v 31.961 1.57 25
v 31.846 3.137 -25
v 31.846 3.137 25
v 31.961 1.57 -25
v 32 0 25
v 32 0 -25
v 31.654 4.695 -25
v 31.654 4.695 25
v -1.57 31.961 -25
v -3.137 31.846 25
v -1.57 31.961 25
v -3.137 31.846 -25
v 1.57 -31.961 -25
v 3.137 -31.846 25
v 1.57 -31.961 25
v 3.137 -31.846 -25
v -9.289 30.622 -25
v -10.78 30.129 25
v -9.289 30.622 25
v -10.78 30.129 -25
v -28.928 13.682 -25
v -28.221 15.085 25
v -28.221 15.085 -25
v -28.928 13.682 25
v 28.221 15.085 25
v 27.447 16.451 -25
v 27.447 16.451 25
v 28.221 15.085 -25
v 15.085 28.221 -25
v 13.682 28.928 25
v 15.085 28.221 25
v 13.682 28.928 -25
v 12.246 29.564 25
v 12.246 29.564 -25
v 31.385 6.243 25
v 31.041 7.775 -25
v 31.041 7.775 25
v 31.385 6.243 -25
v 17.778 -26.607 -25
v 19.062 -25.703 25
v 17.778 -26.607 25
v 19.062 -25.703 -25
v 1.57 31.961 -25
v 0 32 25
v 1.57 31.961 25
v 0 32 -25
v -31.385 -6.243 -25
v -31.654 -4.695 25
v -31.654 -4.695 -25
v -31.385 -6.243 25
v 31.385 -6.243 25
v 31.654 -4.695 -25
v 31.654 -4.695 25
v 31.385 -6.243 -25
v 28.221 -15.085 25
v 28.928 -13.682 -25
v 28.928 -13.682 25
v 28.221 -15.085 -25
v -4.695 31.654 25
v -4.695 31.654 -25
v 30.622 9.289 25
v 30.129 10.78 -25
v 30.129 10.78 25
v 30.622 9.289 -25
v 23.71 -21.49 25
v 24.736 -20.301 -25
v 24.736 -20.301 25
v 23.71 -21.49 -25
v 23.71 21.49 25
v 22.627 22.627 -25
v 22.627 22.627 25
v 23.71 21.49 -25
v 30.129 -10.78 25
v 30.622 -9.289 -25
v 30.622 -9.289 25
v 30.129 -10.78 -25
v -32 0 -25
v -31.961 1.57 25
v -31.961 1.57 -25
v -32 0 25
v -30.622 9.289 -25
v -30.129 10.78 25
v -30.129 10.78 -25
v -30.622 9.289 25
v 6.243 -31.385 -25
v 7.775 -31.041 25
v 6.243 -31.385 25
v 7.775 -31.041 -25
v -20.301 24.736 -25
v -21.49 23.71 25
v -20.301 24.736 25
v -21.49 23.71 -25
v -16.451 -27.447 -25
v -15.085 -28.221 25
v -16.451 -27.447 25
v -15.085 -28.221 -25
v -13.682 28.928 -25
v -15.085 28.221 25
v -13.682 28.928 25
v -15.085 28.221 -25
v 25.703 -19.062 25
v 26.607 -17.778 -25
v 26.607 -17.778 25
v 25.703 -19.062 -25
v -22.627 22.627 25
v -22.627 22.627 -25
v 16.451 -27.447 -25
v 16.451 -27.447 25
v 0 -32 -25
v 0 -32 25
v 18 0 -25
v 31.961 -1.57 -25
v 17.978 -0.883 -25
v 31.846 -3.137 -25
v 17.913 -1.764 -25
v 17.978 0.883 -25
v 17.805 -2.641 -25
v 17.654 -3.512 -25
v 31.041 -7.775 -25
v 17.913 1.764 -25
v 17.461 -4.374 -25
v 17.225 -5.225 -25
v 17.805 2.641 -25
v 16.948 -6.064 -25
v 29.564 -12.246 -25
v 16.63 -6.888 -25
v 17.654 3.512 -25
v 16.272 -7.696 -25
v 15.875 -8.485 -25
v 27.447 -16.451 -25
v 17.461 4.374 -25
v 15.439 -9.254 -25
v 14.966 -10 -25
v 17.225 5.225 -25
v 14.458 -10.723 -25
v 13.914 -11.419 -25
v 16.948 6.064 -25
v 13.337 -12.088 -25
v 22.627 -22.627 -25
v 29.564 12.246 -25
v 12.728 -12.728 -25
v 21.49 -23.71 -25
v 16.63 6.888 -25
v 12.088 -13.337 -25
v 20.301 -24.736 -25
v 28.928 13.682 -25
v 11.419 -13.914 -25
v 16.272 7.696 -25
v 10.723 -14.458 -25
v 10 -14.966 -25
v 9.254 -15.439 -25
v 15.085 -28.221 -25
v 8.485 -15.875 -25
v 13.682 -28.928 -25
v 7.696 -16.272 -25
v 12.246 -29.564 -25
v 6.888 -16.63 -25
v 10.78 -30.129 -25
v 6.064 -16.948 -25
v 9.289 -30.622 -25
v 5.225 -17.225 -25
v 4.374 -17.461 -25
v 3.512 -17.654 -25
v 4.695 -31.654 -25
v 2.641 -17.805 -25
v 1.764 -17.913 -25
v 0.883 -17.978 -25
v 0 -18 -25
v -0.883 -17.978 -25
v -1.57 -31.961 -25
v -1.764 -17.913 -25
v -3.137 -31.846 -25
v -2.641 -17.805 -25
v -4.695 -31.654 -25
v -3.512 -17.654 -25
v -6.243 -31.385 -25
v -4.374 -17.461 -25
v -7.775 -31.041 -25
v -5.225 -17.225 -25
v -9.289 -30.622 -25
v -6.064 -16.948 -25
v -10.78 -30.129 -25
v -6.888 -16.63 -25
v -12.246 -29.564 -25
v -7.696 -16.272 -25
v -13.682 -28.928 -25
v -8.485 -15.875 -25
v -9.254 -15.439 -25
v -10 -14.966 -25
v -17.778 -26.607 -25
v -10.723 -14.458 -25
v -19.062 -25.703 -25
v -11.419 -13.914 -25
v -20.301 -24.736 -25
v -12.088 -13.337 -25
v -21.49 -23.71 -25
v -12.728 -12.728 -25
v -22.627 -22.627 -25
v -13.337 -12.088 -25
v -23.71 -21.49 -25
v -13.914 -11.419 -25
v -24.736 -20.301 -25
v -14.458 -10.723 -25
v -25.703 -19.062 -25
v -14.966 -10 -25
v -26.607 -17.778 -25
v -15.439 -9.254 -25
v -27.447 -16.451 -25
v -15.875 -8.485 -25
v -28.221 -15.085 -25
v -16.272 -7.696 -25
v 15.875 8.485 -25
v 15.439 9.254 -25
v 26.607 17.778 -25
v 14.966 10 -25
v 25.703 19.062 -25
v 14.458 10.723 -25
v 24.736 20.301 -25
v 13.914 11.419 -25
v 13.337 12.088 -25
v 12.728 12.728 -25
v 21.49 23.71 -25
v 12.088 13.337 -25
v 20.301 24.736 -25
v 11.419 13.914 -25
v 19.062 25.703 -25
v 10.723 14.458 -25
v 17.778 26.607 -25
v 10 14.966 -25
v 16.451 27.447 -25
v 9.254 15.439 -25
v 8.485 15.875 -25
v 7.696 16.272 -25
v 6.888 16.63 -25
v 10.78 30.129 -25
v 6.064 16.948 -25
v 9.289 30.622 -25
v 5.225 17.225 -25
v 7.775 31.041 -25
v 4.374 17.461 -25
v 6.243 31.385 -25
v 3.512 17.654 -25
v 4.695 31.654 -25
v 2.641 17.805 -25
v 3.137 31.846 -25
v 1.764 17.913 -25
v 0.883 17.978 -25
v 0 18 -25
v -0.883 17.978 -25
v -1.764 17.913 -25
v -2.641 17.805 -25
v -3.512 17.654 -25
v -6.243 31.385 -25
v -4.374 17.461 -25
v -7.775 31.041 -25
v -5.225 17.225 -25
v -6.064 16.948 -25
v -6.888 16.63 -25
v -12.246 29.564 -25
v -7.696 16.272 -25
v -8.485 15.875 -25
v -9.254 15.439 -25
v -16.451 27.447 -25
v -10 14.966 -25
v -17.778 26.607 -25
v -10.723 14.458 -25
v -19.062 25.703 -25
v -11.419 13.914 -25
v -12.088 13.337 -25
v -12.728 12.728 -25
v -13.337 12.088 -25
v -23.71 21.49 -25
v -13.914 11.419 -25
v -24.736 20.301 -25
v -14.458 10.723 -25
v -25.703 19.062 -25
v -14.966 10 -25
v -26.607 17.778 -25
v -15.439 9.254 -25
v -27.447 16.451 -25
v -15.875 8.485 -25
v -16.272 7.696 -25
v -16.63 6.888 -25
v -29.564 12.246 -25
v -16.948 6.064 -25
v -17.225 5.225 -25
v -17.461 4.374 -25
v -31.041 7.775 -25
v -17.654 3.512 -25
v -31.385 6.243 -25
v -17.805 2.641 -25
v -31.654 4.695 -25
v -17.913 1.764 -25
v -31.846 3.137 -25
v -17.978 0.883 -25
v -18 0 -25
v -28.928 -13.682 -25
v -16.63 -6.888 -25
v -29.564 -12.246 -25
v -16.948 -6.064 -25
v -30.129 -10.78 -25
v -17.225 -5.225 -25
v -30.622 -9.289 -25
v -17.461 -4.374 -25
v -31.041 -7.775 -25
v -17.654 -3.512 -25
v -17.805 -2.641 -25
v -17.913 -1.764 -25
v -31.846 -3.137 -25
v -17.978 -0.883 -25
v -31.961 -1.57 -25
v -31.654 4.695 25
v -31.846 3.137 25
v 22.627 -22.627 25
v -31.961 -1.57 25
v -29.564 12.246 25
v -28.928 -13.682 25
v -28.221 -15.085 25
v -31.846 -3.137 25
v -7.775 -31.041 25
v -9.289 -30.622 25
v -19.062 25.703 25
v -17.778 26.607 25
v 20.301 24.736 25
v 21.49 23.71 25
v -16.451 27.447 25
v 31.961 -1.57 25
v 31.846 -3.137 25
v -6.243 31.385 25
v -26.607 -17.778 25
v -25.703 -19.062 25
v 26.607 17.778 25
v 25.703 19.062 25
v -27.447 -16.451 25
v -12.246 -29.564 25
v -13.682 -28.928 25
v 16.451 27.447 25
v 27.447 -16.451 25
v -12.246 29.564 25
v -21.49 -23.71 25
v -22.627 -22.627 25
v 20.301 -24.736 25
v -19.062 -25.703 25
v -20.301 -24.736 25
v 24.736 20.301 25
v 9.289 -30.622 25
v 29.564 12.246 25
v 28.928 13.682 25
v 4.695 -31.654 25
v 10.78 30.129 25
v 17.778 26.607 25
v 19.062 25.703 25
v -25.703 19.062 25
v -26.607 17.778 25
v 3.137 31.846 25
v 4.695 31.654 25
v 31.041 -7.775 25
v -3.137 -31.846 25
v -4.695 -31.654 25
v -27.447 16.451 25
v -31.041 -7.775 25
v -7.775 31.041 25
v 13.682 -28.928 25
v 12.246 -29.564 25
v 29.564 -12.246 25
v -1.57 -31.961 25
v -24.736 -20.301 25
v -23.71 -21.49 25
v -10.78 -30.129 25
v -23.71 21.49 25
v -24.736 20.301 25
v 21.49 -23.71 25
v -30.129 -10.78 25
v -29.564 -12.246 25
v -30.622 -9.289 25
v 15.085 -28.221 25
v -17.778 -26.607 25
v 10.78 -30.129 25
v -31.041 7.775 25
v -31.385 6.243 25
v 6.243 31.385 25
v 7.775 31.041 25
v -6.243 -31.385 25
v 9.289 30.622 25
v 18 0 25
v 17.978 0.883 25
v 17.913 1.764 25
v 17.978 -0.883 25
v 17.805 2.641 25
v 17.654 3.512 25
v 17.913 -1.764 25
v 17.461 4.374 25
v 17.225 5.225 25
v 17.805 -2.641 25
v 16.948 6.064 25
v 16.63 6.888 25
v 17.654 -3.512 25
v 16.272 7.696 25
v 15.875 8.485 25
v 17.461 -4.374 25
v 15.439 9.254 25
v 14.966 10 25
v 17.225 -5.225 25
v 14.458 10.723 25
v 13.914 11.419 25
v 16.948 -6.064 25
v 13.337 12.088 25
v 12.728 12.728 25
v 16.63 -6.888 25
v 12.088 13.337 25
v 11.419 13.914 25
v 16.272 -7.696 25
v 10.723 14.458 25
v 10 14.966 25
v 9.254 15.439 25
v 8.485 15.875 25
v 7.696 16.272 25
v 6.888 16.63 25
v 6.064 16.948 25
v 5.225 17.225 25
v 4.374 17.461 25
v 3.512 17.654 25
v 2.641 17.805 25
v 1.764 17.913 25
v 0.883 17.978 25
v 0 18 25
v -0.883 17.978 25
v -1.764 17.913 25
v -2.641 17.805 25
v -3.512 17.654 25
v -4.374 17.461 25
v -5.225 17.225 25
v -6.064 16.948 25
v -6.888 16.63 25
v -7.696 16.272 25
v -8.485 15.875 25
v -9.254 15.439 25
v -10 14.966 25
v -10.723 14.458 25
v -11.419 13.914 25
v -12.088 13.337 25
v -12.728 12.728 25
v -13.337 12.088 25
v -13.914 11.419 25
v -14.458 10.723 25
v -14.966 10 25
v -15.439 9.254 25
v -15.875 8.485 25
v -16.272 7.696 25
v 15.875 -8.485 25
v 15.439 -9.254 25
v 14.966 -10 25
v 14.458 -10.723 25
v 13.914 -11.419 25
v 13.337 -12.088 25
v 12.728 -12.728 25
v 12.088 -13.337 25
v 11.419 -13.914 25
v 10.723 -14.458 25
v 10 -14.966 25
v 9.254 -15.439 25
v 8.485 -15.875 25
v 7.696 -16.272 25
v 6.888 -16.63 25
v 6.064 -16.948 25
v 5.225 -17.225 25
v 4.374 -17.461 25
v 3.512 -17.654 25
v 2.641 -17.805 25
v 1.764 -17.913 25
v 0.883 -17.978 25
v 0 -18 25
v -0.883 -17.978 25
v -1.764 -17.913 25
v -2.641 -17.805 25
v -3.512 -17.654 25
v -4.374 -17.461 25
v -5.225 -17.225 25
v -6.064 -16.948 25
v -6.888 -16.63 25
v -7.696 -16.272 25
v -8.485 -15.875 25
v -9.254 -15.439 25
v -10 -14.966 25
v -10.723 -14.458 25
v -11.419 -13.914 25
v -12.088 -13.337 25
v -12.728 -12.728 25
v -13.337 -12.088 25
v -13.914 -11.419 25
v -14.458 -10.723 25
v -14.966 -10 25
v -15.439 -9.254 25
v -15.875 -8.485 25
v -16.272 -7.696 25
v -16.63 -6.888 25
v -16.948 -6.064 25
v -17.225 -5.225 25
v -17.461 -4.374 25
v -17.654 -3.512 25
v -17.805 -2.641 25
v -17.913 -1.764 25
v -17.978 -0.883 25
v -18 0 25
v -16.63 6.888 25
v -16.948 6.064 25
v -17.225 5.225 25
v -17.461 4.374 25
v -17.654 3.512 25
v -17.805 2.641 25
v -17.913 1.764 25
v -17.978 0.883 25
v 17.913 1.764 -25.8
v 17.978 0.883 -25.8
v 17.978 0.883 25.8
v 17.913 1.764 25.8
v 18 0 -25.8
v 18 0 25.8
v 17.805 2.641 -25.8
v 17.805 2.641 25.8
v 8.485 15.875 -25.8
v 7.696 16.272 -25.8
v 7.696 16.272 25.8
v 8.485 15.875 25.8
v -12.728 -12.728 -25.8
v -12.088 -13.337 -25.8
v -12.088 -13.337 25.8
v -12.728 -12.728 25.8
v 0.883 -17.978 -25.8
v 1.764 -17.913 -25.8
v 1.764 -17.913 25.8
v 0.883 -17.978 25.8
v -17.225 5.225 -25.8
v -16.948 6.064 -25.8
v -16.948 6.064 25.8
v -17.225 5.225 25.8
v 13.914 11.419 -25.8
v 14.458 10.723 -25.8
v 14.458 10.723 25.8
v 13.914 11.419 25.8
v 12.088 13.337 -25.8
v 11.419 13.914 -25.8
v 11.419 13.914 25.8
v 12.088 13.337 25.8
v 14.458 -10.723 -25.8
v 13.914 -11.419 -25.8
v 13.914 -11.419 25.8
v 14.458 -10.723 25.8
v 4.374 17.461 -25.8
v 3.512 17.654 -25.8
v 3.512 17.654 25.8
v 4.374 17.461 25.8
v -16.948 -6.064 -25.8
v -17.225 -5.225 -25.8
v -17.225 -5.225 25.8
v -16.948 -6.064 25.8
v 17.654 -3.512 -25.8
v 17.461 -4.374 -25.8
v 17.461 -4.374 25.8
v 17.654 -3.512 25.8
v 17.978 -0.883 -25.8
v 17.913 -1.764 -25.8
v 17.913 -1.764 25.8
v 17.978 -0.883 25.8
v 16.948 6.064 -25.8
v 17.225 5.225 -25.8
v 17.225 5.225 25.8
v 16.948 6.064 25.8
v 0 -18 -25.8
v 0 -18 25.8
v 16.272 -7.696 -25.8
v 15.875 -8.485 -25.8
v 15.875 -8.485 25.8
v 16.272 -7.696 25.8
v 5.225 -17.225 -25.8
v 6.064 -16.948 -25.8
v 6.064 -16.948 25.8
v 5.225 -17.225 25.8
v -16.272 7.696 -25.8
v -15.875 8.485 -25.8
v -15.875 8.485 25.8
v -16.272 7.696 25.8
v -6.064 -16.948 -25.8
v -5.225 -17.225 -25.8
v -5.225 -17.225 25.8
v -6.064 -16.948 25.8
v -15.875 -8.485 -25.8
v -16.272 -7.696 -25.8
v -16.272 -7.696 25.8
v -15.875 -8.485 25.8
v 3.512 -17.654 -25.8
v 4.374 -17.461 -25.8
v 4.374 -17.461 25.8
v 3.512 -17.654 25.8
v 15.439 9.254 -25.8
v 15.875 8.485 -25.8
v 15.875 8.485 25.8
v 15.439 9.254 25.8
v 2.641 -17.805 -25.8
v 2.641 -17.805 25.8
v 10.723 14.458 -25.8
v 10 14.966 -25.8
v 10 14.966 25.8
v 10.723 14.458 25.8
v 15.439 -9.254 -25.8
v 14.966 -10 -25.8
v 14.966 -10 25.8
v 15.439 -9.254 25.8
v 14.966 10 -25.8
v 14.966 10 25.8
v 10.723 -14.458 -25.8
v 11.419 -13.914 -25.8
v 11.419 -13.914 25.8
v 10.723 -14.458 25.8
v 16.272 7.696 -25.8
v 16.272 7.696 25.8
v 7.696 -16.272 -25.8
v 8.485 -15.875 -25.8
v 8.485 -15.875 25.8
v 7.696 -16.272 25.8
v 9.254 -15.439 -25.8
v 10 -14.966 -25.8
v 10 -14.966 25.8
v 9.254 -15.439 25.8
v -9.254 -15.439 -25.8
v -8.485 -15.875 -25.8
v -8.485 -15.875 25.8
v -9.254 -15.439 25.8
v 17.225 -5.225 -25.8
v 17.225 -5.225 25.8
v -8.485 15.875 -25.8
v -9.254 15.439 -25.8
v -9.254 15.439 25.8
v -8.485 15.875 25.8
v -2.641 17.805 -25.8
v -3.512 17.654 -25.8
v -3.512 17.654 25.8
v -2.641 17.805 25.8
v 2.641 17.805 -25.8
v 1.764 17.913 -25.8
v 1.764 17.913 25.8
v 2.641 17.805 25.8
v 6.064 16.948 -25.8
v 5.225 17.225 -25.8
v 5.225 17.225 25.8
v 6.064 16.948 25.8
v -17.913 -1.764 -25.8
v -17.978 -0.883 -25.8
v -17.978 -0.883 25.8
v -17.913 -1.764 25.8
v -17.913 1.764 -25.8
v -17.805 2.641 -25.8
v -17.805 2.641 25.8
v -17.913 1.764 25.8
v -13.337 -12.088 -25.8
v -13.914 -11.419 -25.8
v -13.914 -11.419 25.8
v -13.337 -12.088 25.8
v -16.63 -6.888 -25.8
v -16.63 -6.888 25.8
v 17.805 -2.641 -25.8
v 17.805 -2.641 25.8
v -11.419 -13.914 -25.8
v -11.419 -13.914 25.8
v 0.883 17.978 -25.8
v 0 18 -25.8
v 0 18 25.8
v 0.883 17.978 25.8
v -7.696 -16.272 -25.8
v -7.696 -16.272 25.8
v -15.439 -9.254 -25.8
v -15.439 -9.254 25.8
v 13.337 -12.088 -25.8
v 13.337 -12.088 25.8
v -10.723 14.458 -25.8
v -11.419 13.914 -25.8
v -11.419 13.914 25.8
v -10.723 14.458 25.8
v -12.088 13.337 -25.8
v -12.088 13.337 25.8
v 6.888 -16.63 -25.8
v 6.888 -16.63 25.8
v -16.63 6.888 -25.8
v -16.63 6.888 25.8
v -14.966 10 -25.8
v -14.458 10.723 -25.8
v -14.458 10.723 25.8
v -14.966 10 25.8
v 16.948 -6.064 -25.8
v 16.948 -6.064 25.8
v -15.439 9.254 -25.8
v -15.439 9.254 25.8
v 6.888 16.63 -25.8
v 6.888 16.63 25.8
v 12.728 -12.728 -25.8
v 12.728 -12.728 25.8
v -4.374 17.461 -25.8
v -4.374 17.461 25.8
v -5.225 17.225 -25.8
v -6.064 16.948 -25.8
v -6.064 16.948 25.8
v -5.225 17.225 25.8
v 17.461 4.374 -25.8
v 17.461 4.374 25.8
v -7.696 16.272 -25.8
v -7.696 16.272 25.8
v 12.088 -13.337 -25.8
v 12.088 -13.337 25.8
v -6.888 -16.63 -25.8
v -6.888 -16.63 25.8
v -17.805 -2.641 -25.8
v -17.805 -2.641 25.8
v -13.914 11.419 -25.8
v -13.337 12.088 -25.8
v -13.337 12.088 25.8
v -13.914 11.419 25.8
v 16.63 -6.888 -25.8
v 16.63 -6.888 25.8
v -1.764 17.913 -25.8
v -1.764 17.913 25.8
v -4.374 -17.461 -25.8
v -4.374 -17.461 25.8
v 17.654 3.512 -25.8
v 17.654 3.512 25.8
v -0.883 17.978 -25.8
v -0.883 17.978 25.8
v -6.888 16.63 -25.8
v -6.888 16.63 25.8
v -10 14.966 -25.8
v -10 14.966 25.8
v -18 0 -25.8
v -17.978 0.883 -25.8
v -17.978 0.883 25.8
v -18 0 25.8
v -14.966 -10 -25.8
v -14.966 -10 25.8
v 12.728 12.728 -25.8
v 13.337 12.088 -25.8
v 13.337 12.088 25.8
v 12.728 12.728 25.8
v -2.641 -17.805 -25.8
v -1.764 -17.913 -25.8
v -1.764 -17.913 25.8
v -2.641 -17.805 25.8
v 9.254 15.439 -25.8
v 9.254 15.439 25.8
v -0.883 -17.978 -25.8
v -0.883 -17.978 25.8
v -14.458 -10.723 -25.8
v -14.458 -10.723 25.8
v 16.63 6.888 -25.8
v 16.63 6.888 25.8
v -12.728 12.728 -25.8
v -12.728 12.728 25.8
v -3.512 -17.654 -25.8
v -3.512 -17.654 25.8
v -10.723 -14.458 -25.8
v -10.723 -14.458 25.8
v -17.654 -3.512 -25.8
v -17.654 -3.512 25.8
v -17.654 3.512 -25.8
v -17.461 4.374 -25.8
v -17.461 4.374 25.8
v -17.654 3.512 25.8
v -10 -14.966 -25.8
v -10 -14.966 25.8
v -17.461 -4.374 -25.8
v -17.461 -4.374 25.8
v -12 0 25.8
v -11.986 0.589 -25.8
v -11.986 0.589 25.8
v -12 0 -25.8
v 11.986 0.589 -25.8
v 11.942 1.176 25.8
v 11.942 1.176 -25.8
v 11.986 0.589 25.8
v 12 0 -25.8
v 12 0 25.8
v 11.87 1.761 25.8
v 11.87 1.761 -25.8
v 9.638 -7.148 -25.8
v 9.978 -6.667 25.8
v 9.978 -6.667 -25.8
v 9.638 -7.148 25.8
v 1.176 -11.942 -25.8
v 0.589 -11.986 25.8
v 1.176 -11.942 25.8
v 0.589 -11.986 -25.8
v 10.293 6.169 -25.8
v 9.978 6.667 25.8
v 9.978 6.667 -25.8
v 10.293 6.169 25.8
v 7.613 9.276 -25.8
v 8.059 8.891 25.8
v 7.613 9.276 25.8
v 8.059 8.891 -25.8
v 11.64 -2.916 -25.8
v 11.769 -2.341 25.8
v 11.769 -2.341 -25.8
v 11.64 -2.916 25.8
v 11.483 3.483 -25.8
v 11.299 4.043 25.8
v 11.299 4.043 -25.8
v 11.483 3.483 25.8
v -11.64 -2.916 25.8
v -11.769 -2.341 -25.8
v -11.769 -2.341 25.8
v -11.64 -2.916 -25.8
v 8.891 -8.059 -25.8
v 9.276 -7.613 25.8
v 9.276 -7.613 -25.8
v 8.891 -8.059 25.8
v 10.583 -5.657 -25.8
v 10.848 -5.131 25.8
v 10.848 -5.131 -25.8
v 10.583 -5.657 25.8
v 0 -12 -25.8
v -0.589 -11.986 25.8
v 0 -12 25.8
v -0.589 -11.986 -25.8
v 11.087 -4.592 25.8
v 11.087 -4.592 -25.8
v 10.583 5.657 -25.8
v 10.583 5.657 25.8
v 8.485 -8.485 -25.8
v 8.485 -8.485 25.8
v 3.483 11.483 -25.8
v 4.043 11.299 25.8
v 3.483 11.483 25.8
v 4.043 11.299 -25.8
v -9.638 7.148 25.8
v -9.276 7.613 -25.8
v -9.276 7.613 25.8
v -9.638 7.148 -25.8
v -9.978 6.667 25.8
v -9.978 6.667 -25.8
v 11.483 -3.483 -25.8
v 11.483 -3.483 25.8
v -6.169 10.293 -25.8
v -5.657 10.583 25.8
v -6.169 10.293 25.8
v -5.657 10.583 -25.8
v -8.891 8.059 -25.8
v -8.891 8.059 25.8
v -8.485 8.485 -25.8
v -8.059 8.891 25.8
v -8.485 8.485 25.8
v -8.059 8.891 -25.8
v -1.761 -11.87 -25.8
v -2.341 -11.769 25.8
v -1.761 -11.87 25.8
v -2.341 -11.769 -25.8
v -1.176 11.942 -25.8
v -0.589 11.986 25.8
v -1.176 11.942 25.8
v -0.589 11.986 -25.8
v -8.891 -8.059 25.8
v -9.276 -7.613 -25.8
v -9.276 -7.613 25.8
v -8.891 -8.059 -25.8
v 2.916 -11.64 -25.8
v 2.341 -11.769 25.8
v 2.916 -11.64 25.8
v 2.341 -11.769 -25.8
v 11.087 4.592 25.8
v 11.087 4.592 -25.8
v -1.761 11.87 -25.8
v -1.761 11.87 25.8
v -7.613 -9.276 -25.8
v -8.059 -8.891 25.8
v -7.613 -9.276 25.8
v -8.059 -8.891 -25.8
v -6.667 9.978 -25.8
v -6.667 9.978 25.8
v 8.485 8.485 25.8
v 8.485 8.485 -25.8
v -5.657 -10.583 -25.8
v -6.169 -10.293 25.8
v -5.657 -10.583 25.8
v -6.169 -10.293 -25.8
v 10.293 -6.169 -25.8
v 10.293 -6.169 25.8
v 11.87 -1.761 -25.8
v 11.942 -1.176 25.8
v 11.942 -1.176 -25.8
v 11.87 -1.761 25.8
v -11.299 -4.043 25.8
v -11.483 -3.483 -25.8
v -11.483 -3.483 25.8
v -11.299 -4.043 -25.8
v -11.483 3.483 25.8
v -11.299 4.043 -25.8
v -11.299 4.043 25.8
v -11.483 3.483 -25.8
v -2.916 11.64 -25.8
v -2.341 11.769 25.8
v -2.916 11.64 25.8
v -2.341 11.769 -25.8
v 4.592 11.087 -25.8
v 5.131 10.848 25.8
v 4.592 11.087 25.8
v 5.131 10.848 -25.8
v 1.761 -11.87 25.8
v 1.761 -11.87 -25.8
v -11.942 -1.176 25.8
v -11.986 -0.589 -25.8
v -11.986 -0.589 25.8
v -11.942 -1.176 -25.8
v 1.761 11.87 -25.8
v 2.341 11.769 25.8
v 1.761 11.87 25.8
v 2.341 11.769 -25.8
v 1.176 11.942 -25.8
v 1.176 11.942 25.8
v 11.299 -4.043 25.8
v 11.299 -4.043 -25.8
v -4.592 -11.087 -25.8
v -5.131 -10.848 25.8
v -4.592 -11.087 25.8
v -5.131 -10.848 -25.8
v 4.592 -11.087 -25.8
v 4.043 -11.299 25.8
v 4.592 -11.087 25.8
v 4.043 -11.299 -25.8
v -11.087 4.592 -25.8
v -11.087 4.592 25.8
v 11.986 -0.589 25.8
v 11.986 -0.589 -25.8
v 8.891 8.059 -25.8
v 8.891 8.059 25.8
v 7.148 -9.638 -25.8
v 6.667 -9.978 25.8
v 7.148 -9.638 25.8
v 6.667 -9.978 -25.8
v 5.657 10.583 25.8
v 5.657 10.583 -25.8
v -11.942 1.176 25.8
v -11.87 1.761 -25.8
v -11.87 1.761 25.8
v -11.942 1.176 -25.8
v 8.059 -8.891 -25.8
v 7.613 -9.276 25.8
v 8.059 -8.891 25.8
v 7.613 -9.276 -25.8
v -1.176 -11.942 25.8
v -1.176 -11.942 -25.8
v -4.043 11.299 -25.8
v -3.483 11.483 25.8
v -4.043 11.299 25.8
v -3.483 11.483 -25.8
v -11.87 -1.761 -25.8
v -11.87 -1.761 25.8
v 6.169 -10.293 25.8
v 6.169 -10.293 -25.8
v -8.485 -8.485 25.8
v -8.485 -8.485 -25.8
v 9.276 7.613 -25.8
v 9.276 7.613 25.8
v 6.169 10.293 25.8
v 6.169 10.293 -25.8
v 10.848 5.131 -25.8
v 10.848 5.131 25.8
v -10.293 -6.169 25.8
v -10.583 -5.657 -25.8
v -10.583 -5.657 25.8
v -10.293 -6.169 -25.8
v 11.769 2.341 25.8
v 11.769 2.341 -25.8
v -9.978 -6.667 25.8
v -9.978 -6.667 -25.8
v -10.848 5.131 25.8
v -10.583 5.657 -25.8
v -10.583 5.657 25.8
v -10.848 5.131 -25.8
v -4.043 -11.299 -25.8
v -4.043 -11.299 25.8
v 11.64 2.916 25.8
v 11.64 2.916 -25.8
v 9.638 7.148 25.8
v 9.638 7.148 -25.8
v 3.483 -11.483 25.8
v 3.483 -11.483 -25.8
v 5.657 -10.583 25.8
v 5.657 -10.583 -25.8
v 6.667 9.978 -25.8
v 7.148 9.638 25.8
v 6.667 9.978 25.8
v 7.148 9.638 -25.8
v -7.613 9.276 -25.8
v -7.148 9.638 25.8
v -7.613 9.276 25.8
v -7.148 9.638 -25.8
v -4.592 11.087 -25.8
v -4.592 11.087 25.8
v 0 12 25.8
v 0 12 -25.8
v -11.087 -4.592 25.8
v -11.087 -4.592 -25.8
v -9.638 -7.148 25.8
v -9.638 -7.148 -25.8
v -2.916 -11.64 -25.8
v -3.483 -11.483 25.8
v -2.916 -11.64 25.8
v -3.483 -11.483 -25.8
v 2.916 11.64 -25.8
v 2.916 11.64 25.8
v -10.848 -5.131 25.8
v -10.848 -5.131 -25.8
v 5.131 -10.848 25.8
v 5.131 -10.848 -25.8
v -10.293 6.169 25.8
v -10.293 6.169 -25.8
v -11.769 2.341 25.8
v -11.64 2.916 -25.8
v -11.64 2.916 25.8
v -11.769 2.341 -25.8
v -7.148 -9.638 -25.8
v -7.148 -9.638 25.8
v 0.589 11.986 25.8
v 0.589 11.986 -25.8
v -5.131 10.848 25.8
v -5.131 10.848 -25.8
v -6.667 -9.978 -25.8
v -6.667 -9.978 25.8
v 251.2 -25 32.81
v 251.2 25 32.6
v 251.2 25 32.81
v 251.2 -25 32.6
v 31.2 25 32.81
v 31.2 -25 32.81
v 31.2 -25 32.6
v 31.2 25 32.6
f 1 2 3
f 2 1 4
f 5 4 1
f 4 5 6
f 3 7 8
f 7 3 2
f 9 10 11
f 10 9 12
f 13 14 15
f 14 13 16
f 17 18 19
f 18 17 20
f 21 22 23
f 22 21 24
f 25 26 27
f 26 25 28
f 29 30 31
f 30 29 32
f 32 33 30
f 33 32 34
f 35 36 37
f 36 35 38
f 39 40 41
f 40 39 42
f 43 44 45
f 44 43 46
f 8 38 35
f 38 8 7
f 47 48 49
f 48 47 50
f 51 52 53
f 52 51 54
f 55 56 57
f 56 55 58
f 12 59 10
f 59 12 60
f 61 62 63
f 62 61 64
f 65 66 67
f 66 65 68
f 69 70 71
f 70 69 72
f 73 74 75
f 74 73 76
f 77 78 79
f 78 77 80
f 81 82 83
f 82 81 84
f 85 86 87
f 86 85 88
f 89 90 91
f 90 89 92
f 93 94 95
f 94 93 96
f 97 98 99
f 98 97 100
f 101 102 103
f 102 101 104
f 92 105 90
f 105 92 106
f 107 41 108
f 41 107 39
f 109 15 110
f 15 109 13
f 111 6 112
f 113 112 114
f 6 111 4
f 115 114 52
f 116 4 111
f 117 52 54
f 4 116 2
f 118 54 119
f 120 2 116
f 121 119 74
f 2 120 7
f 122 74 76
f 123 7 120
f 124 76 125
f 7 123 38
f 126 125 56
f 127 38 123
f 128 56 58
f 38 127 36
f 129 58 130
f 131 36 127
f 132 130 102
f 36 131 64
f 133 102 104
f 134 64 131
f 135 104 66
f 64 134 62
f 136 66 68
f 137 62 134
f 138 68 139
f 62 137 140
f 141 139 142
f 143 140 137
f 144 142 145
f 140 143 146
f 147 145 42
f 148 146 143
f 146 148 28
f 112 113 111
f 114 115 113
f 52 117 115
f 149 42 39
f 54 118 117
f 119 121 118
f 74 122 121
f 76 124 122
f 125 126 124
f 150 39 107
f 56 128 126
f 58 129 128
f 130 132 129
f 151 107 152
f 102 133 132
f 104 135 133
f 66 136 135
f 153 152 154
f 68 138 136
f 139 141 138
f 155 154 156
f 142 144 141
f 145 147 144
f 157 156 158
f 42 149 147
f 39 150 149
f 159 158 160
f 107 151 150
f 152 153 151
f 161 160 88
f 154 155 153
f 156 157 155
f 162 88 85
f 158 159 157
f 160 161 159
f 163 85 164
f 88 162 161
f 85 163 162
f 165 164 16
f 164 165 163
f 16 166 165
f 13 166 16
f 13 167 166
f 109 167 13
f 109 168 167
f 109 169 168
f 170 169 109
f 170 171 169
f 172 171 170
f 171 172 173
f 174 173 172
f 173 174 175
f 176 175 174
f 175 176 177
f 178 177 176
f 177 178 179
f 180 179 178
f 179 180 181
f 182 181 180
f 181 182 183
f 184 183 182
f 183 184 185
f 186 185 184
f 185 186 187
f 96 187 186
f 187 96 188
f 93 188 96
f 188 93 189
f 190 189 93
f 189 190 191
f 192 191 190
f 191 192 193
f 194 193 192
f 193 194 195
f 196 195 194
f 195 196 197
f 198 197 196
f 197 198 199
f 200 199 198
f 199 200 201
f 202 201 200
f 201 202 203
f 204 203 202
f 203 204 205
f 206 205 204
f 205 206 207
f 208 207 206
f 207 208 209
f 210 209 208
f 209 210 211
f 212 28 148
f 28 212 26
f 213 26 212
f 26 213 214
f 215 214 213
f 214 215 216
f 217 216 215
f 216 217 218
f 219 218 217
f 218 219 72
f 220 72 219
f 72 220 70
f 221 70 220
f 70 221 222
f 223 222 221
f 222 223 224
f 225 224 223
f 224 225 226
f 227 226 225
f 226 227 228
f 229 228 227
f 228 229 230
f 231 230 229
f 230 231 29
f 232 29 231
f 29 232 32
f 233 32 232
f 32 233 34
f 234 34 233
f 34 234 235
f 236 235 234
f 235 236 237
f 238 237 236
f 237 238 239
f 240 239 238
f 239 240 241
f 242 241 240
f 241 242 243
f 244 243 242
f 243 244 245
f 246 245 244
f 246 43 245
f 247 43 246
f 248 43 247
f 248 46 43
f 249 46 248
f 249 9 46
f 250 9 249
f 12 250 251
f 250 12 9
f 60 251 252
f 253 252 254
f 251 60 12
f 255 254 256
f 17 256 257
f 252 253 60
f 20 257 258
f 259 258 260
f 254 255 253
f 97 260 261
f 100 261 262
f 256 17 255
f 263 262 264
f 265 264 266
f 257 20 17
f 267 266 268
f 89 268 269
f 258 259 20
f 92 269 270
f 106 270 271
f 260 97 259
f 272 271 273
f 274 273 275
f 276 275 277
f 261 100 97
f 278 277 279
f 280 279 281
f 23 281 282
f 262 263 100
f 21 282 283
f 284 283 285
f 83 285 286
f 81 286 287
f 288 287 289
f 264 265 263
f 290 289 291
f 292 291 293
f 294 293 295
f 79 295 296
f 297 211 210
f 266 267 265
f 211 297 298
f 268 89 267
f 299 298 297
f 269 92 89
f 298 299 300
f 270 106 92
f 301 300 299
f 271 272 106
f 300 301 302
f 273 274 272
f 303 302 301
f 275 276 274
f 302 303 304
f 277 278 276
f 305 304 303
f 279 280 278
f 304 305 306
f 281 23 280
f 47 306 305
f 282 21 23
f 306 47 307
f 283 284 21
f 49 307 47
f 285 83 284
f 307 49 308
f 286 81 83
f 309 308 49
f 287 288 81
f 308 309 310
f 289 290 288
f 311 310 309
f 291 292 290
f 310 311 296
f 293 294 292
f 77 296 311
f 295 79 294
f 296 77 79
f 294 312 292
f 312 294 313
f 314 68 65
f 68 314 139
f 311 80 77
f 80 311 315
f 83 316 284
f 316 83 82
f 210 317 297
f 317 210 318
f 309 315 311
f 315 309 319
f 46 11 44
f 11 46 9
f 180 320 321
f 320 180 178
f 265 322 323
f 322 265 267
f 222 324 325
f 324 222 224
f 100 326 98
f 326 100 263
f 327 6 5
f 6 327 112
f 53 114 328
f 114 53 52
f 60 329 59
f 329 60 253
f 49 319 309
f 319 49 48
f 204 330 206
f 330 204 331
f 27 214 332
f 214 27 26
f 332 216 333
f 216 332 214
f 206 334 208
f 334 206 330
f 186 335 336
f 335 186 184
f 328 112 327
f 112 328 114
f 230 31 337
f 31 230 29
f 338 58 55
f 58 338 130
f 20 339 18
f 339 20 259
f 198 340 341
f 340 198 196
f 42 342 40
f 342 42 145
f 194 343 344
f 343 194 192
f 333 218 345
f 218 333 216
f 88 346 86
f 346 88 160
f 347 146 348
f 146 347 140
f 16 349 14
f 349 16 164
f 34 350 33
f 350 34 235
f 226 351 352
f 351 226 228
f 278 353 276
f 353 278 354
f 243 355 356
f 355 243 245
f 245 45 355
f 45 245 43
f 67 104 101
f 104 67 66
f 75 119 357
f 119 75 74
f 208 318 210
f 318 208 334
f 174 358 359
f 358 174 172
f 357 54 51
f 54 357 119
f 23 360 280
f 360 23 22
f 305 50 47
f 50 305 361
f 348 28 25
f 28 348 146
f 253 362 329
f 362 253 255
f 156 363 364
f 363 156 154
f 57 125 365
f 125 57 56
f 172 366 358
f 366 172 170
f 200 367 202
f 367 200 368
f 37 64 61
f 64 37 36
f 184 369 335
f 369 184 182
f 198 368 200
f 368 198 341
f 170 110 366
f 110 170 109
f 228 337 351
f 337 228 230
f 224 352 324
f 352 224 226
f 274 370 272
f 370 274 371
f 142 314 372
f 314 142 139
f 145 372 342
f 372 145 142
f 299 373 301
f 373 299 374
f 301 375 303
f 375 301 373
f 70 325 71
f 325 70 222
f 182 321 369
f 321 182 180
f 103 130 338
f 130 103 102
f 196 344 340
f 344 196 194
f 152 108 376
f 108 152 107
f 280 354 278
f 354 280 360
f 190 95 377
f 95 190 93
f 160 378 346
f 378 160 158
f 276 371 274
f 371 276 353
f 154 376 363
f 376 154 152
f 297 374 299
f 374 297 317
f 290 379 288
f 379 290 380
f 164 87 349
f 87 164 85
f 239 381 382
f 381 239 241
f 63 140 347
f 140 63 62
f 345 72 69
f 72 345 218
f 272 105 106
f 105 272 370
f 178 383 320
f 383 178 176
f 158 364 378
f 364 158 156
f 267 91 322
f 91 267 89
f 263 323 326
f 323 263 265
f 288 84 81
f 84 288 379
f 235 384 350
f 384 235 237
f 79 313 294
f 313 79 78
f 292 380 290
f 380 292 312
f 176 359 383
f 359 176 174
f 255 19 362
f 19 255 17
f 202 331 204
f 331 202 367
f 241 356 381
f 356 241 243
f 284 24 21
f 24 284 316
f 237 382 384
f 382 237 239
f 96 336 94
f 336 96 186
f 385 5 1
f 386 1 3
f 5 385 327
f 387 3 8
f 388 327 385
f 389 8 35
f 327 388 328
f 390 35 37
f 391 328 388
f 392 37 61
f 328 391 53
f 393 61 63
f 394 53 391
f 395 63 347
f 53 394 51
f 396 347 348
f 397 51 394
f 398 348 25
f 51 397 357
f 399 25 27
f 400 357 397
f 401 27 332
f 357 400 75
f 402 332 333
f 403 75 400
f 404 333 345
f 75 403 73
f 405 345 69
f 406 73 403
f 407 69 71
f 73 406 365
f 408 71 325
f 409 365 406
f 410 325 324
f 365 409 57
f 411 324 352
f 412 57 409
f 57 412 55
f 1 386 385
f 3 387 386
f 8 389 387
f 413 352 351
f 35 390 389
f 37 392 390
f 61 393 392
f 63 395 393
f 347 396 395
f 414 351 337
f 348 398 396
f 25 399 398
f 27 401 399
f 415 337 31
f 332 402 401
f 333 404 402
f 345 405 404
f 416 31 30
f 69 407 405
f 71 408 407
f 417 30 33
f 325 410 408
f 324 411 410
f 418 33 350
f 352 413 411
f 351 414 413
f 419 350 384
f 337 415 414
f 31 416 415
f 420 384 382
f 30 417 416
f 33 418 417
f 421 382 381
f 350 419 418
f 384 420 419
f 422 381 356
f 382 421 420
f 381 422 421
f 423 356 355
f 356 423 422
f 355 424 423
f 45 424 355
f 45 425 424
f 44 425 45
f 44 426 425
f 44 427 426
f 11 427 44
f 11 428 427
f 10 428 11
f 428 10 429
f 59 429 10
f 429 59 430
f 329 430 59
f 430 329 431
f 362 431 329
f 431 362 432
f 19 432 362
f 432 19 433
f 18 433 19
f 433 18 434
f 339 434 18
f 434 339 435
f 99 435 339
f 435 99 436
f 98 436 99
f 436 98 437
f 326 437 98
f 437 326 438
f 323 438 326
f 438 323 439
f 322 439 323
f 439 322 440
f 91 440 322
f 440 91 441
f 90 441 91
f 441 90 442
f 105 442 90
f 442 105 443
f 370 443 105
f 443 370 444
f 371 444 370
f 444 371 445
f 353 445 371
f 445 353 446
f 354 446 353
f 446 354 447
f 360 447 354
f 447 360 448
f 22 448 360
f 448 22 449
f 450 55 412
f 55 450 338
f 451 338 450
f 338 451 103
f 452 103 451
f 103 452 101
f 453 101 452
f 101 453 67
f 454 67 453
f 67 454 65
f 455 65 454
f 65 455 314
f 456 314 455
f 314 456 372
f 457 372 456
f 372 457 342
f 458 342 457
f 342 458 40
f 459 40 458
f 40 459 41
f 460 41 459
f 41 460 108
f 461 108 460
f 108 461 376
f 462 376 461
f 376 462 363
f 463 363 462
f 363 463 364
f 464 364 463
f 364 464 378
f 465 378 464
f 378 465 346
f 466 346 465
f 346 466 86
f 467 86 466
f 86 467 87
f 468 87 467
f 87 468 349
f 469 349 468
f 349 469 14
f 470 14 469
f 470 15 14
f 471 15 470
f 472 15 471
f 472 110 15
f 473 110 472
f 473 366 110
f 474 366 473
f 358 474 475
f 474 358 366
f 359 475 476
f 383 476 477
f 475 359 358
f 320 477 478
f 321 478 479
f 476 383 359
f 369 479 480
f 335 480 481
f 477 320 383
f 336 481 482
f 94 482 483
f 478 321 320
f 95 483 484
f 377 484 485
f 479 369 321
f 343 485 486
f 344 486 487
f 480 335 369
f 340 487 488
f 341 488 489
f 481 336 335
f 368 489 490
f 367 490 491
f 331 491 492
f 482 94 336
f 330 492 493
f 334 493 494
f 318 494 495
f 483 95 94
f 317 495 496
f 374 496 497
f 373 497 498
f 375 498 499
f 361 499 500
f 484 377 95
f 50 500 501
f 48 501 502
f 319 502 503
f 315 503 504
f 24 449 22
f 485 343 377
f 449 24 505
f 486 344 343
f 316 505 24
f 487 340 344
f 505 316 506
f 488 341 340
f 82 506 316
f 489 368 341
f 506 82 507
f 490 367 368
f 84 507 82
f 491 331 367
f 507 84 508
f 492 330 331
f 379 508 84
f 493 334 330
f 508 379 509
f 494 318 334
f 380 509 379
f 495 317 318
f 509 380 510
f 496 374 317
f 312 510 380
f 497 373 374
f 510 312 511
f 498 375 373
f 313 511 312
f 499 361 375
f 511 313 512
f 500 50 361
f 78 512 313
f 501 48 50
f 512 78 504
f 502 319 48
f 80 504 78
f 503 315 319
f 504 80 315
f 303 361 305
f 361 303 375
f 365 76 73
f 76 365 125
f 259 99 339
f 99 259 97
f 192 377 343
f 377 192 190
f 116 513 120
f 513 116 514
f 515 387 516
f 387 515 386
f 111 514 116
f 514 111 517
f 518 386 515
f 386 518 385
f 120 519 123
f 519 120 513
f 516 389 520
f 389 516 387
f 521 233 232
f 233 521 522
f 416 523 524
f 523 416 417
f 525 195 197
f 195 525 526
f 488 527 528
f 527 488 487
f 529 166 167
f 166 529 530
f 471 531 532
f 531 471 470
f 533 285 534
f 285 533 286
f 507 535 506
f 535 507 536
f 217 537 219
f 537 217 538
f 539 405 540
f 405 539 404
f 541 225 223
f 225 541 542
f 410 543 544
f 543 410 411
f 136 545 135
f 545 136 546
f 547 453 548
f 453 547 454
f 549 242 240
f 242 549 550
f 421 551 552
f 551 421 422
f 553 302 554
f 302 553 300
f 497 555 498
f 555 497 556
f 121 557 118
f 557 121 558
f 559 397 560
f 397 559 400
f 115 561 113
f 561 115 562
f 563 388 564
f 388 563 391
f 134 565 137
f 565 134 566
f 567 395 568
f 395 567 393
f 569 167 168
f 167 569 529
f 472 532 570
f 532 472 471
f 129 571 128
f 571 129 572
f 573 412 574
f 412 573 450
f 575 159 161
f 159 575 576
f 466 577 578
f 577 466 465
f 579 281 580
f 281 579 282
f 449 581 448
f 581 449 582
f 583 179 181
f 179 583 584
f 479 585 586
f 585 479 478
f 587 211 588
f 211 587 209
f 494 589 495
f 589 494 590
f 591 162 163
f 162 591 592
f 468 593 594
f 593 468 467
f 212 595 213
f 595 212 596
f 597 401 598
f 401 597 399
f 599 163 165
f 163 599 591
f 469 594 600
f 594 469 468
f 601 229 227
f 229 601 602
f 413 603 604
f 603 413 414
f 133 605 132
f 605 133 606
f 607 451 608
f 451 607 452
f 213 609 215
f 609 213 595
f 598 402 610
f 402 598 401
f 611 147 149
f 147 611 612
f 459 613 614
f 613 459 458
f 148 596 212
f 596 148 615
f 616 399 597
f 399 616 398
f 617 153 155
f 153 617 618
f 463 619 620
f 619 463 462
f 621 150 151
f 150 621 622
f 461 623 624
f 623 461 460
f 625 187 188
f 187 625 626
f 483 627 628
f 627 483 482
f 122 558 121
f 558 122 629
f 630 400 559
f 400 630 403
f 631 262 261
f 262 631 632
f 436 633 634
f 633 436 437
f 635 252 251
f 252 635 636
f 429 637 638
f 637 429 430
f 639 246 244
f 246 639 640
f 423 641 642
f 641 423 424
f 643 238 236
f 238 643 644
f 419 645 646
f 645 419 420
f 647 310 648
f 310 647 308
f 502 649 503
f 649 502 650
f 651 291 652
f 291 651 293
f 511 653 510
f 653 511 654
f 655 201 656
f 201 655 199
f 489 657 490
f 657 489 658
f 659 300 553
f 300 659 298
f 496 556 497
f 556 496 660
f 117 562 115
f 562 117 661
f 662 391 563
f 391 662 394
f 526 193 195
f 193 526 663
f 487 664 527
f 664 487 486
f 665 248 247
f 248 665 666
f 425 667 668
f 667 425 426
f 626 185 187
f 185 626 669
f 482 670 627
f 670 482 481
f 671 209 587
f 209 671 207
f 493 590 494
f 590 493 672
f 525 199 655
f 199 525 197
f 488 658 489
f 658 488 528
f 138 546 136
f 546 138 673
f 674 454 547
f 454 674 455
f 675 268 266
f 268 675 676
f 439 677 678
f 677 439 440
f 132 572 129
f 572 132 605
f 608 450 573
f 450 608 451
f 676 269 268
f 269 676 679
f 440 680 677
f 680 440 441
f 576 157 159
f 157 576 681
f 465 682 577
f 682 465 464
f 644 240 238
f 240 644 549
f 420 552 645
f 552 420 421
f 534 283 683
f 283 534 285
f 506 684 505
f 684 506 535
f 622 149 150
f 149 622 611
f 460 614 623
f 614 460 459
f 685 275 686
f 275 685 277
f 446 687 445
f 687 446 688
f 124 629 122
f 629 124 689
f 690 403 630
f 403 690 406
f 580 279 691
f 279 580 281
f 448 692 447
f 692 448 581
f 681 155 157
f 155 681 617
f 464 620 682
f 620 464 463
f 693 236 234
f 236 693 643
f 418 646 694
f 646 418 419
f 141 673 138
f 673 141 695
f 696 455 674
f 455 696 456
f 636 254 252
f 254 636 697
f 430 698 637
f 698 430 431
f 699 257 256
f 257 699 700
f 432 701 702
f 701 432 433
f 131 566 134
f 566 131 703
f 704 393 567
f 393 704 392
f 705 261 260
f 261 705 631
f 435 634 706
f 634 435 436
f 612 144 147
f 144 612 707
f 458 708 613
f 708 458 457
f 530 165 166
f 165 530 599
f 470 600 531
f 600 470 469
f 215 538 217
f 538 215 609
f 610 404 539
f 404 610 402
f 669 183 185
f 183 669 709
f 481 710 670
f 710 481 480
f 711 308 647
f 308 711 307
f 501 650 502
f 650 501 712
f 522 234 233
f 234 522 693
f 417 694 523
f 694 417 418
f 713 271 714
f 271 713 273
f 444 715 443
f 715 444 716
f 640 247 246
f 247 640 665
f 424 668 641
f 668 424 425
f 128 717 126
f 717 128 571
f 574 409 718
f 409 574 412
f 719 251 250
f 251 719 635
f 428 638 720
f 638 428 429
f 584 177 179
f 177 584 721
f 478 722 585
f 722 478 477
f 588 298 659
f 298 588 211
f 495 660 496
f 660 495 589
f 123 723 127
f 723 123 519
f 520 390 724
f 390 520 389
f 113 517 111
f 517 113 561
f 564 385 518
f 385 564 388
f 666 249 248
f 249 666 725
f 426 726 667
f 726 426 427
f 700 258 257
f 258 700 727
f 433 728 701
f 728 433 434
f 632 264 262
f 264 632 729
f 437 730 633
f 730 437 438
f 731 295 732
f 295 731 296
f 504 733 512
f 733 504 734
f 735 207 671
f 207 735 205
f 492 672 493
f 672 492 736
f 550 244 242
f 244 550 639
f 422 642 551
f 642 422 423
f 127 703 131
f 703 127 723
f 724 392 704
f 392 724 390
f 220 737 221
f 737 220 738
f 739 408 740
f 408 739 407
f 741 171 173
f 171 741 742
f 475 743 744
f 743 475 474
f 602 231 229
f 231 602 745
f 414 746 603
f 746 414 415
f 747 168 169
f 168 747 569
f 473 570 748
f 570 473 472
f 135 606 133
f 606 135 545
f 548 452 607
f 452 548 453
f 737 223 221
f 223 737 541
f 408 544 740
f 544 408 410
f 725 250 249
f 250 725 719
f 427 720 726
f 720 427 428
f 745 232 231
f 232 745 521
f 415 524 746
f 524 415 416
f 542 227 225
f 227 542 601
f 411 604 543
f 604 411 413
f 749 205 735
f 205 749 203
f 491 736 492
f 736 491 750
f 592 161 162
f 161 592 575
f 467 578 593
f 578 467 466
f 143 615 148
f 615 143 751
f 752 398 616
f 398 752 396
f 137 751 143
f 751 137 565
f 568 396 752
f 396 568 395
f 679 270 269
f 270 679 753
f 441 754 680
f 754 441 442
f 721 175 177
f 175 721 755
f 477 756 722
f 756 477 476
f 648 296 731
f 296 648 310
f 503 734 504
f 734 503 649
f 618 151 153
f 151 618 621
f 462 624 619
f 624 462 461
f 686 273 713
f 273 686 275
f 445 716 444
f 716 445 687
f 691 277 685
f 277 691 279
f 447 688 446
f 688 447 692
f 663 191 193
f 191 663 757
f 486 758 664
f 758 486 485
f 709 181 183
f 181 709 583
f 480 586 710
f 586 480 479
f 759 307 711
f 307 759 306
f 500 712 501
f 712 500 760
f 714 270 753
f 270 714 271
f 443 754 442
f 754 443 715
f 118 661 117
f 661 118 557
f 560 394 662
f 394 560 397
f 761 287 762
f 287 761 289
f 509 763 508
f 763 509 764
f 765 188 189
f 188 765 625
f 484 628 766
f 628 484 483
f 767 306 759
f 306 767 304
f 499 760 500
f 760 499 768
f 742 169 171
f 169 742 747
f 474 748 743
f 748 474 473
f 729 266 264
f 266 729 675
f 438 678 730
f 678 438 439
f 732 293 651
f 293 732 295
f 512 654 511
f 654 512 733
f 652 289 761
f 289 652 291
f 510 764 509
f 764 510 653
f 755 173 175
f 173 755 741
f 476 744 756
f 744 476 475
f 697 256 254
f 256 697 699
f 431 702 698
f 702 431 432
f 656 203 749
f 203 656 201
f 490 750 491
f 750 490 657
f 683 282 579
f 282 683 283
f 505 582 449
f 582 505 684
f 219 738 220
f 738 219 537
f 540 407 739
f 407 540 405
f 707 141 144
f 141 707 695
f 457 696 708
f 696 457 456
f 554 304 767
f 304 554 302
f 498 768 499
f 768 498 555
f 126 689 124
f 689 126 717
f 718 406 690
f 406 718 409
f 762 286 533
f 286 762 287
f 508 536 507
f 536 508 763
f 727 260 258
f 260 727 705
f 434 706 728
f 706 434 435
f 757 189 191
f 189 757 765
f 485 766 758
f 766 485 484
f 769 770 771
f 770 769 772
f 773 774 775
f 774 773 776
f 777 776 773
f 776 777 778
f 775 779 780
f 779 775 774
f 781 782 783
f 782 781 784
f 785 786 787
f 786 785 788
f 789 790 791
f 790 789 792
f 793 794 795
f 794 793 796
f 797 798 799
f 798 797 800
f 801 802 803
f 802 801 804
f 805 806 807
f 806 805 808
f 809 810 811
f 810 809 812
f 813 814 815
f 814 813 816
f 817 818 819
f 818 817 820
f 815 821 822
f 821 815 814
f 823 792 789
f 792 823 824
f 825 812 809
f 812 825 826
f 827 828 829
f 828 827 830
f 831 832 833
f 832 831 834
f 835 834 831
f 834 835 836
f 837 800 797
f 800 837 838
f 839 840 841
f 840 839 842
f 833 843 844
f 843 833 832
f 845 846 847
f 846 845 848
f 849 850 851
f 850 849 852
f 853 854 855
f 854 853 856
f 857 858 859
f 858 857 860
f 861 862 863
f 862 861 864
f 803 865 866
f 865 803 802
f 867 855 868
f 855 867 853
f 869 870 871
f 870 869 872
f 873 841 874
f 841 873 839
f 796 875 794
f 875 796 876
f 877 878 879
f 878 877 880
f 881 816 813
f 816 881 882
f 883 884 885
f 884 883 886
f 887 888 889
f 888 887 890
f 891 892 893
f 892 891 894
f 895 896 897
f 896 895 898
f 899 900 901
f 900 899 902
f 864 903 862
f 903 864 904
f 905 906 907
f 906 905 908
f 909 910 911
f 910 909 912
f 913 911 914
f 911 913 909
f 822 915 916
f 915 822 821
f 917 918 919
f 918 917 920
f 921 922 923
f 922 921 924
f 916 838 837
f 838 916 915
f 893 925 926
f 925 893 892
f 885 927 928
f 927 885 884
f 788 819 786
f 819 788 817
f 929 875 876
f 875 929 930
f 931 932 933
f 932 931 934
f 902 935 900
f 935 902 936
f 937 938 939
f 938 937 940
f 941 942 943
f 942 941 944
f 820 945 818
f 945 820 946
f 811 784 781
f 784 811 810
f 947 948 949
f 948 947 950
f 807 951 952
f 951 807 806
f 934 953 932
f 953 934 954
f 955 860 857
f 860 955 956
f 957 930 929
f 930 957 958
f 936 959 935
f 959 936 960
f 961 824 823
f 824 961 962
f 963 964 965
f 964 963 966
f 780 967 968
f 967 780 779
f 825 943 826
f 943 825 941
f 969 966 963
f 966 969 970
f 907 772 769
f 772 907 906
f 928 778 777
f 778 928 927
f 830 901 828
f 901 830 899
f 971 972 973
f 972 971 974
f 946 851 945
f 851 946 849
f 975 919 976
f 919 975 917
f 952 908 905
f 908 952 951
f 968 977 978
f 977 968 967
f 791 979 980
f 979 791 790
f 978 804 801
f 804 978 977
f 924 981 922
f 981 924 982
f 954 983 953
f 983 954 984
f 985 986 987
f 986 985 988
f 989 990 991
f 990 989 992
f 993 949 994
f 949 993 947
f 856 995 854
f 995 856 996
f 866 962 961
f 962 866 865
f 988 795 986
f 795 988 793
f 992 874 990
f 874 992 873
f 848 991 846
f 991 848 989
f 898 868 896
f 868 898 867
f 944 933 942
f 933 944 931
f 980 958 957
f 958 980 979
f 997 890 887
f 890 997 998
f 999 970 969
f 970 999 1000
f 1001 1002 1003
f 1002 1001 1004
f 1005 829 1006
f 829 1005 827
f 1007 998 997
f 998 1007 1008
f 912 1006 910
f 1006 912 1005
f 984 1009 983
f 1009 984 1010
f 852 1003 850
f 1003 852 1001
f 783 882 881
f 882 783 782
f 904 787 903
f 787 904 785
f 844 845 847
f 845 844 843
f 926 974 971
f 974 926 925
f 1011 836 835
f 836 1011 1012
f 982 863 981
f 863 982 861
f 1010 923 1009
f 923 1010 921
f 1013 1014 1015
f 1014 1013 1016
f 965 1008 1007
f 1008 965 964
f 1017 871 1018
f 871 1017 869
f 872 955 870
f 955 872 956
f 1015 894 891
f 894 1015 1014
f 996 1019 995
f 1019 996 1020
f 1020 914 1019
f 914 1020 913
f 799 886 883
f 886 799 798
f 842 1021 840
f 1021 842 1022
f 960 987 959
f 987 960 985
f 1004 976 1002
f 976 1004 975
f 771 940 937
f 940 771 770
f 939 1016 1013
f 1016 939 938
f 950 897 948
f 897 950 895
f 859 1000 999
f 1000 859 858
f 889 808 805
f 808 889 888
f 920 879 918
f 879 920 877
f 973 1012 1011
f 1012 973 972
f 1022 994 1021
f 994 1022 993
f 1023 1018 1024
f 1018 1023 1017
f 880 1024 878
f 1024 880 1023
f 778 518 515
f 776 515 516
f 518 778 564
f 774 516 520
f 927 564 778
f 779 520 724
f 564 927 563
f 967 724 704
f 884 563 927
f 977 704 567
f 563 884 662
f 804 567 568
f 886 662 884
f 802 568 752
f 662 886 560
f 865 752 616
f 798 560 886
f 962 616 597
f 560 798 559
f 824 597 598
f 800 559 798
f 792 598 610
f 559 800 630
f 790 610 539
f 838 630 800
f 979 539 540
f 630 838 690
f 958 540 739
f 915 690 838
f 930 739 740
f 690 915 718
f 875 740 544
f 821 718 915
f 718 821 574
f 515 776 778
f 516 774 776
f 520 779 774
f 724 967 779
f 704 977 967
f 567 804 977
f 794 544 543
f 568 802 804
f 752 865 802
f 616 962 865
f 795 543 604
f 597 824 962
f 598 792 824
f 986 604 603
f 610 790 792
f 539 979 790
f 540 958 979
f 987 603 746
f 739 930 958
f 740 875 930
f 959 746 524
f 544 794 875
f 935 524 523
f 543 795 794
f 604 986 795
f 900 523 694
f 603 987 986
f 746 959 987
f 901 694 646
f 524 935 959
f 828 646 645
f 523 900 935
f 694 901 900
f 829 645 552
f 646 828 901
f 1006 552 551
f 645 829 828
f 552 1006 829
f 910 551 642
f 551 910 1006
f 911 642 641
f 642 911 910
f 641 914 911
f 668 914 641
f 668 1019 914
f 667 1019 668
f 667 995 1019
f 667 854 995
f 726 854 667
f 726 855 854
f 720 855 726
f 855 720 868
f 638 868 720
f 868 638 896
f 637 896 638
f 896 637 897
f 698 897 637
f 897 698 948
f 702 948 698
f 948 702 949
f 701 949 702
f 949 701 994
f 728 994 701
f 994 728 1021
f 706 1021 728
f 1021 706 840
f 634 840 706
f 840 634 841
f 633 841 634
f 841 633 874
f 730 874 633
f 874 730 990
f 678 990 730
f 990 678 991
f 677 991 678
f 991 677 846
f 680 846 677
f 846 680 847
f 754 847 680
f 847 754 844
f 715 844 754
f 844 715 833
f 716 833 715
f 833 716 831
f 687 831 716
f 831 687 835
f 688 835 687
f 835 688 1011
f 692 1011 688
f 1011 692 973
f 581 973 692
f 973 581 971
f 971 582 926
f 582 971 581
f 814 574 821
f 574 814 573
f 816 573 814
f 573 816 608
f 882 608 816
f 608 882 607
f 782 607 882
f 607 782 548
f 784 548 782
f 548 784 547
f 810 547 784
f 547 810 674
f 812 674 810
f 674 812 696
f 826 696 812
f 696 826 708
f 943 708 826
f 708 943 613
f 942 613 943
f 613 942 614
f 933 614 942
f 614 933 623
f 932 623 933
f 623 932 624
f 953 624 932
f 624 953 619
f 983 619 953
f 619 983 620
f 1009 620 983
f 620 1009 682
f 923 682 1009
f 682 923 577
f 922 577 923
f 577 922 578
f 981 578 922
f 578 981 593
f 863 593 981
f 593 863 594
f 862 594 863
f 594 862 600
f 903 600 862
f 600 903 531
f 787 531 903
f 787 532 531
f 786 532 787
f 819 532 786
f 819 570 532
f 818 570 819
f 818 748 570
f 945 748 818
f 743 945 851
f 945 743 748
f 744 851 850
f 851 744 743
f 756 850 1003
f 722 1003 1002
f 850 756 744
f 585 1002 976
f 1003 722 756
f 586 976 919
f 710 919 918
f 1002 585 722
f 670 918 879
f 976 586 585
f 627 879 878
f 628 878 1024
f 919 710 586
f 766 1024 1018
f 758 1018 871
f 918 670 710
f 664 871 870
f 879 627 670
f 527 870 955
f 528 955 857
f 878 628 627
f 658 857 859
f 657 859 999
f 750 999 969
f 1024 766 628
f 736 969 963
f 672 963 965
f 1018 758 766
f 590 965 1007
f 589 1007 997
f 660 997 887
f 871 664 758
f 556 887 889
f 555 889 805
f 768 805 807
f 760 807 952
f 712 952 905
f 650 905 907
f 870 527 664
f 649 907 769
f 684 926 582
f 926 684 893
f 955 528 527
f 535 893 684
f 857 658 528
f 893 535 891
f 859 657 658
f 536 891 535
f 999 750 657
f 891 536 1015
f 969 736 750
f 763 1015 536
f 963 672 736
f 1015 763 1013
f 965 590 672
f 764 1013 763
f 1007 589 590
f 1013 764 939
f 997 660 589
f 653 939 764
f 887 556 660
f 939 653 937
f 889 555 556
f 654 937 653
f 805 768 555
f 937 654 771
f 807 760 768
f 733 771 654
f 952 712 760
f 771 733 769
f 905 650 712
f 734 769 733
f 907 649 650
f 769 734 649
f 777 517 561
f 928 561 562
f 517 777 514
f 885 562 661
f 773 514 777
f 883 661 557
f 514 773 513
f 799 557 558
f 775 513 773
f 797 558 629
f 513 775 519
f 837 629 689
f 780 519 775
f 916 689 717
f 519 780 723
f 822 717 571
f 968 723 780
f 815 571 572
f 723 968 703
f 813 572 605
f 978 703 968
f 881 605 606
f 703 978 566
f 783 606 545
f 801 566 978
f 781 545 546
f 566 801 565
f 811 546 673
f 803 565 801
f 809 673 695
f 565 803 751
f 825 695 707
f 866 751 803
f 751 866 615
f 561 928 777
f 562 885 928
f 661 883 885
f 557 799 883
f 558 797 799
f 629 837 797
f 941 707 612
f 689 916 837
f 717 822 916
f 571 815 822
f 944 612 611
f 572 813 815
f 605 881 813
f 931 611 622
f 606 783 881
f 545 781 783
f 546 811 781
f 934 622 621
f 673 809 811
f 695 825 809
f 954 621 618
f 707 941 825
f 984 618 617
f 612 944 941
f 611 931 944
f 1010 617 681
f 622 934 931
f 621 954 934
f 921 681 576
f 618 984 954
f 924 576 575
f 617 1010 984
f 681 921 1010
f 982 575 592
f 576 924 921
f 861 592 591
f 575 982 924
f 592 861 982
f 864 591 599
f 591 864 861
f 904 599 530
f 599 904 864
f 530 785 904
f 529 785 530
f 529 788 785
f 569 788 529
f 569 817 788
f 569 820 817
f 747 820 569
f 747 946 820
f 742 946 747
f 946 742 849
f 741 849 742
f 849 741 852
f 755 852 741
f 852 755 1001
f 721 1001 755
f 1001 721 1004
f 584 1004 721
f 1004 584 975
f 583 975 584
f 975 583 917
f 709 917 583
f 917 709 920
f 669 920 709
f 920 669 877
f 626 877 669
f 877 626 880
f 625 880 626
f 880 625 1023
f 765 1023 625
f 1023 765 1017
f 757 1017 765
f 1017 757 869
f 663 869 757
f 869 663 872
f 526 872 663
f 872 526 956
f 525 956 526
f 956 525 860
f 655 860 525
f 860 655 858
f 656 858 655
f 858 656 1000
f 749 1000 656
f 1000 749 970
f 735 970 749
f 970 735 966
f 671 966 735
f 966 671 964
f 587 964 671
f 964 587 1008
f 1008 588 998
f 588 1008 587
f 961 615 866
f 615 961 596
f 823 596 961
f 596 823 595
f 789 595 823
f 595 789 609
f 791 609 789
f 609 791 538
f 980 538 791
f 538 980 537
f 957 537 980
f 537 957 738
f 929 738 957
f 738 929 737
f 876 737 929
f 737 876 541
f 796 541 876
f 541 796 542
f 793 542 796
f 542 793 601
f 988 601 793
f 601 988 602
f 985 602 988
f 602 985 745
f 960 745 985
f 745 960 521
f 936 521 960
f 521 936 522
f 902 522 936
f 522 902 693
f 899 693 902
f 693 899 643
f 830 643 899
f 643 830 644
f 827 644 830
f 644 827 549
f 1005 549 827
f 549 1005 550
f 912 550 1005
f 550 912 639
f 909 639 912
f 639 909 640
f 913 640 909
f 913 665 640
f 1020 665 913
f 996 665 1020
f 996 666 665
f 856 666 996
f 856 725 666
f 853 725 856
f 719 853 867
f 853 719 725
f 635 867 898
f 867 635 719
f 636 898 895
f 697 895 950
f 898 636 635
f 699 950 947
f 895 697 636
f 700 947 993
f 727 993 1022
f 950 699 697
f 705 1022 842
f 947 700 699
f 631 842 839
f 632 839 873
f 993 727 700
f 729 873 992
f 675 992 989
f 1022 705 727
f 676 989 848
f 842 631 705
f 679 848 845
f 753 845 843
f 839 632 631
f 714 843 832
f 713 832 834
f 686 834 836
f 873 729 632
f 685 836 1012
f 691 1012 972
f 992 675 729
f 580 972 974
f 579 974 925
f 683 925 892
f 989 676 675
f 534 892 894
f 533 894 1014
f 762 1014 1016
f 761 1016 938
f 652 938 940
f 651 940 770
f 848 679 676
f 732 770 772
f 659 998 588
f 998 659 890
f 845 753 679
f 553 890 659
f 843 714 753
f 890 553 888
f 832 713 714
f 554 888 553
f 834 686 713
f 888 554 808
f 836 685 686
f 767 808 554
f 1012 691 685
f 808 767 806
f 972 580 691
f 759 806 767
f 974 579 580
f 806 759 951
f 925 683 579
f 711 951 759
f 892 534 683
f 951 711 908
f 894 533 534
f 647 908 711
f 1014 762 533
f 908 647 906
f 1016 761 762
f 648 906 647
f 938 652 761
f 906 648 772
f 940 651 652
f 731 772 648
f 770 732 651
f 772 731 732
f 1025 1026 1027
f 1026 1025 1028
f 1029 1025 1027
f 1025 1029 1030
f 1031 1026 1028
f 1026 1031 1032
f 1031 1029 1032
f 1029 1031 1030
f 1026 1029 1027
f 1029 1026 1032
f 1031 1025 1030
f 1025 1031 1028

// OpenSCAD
// Aluminium foil tape roll with a short peeled-out sheet (ONE connected solid)

// ---------- Parameters ----------
tape_length = 500;              //[250:1000:1]  // used as max available; tail uses a fraction
tape_width = 50;                //[25:100:1]
tape_thickness = 0.08;          //[0.04:0.16:0.01]
adhesive_thickness = 0.05;      //[0.02:0.12:0.01]
liner_thickness = 0.08;         //[0.04:0.2:0.01]

core_outer_radius = 18;         //[10:36:1]     // cardboard core outer radius
core_inner_radius = 12;         //[6:24:1]
core_width = 55;                //[30:120:1]    // roll width (along axis)

overlap = 0.8;                  //[0.5:2:0.1]   // overlap to ensure watertight unions/differences

// Roll geometry controls
roll_outer_radius = 32;         //[20:60:1]     // overall roll radius (tape wound)
tail_length = 220;              //[50:600:1]    // peeled-out sheet length
tail_lift = 0.6;                //[0:5:0.1]     // slight lift above roll surface

$fn = 128;

// ---------- Derived ----------
layer_total = tape_thickness + adhesive_thickness + liner_thickness;
roll_r = max(roll_outer_radius, core_outer_radius + 2); // ensure roll bigger than core
tail_len = min(tail_length, tape_length);

// Place roll centered at origin, axis along Y.
// Tail exits tangentially to the right (+X) from the outer surface at Z=0.
tail_z = roll_r + layer_total/2 + tail_lift; // top tangent height
tail_x0 = roll_r - overlap;                  // start at tangent point with overlap into roll

// ---------- Modules ----------
module core() {
    // Cardboard core (hollow cylinder)
    difference() {
        cylinder(r=core_outer_radius, h=core_width, center=true);
        cylinder(r=core_inner_radius, h=core_width + 2*overlap, center=true);
    }
}

module tape_roll_body() {
    // Wound tape as a solid ring (no internal spiral for performance)
    difference() {
        cylinder(r=roll_r, h=tape_width, center=true);
        cylinder(r=core_outer_radius - overlap, h=tape_width + 2*overlap, center=true);
    }
}

module tail_sheet() {
    // A thin rectangular tail (foil + adhesive + liner) exiting tangentially
    translate([tail_x0 + tail_len/2, 0, tail_z])
        cube([tail_len, tape_width, layer_total], center=true);
}

module tape_roll_with_tail() {
    // Ensure ONE connected solid by overlapping tail into roll
    union() {
        // Roll (tape wound)
        tape_roll_body();

        // Core inside roll (touch/overlap slightly so it's one connected solid)
        // Overlap by expanding core slightly into tape ring
        intersection() {
            // keep core within roll width
            cylinder(r=roll_r + overlap, h=tape_width + 2*overlap, center=true);
            // core itself
            core();
        }

        // Peeled-out tail
        tail_sheet();
    }
}

// ---------- Final Output ----------
tape_roll_with_tail();
